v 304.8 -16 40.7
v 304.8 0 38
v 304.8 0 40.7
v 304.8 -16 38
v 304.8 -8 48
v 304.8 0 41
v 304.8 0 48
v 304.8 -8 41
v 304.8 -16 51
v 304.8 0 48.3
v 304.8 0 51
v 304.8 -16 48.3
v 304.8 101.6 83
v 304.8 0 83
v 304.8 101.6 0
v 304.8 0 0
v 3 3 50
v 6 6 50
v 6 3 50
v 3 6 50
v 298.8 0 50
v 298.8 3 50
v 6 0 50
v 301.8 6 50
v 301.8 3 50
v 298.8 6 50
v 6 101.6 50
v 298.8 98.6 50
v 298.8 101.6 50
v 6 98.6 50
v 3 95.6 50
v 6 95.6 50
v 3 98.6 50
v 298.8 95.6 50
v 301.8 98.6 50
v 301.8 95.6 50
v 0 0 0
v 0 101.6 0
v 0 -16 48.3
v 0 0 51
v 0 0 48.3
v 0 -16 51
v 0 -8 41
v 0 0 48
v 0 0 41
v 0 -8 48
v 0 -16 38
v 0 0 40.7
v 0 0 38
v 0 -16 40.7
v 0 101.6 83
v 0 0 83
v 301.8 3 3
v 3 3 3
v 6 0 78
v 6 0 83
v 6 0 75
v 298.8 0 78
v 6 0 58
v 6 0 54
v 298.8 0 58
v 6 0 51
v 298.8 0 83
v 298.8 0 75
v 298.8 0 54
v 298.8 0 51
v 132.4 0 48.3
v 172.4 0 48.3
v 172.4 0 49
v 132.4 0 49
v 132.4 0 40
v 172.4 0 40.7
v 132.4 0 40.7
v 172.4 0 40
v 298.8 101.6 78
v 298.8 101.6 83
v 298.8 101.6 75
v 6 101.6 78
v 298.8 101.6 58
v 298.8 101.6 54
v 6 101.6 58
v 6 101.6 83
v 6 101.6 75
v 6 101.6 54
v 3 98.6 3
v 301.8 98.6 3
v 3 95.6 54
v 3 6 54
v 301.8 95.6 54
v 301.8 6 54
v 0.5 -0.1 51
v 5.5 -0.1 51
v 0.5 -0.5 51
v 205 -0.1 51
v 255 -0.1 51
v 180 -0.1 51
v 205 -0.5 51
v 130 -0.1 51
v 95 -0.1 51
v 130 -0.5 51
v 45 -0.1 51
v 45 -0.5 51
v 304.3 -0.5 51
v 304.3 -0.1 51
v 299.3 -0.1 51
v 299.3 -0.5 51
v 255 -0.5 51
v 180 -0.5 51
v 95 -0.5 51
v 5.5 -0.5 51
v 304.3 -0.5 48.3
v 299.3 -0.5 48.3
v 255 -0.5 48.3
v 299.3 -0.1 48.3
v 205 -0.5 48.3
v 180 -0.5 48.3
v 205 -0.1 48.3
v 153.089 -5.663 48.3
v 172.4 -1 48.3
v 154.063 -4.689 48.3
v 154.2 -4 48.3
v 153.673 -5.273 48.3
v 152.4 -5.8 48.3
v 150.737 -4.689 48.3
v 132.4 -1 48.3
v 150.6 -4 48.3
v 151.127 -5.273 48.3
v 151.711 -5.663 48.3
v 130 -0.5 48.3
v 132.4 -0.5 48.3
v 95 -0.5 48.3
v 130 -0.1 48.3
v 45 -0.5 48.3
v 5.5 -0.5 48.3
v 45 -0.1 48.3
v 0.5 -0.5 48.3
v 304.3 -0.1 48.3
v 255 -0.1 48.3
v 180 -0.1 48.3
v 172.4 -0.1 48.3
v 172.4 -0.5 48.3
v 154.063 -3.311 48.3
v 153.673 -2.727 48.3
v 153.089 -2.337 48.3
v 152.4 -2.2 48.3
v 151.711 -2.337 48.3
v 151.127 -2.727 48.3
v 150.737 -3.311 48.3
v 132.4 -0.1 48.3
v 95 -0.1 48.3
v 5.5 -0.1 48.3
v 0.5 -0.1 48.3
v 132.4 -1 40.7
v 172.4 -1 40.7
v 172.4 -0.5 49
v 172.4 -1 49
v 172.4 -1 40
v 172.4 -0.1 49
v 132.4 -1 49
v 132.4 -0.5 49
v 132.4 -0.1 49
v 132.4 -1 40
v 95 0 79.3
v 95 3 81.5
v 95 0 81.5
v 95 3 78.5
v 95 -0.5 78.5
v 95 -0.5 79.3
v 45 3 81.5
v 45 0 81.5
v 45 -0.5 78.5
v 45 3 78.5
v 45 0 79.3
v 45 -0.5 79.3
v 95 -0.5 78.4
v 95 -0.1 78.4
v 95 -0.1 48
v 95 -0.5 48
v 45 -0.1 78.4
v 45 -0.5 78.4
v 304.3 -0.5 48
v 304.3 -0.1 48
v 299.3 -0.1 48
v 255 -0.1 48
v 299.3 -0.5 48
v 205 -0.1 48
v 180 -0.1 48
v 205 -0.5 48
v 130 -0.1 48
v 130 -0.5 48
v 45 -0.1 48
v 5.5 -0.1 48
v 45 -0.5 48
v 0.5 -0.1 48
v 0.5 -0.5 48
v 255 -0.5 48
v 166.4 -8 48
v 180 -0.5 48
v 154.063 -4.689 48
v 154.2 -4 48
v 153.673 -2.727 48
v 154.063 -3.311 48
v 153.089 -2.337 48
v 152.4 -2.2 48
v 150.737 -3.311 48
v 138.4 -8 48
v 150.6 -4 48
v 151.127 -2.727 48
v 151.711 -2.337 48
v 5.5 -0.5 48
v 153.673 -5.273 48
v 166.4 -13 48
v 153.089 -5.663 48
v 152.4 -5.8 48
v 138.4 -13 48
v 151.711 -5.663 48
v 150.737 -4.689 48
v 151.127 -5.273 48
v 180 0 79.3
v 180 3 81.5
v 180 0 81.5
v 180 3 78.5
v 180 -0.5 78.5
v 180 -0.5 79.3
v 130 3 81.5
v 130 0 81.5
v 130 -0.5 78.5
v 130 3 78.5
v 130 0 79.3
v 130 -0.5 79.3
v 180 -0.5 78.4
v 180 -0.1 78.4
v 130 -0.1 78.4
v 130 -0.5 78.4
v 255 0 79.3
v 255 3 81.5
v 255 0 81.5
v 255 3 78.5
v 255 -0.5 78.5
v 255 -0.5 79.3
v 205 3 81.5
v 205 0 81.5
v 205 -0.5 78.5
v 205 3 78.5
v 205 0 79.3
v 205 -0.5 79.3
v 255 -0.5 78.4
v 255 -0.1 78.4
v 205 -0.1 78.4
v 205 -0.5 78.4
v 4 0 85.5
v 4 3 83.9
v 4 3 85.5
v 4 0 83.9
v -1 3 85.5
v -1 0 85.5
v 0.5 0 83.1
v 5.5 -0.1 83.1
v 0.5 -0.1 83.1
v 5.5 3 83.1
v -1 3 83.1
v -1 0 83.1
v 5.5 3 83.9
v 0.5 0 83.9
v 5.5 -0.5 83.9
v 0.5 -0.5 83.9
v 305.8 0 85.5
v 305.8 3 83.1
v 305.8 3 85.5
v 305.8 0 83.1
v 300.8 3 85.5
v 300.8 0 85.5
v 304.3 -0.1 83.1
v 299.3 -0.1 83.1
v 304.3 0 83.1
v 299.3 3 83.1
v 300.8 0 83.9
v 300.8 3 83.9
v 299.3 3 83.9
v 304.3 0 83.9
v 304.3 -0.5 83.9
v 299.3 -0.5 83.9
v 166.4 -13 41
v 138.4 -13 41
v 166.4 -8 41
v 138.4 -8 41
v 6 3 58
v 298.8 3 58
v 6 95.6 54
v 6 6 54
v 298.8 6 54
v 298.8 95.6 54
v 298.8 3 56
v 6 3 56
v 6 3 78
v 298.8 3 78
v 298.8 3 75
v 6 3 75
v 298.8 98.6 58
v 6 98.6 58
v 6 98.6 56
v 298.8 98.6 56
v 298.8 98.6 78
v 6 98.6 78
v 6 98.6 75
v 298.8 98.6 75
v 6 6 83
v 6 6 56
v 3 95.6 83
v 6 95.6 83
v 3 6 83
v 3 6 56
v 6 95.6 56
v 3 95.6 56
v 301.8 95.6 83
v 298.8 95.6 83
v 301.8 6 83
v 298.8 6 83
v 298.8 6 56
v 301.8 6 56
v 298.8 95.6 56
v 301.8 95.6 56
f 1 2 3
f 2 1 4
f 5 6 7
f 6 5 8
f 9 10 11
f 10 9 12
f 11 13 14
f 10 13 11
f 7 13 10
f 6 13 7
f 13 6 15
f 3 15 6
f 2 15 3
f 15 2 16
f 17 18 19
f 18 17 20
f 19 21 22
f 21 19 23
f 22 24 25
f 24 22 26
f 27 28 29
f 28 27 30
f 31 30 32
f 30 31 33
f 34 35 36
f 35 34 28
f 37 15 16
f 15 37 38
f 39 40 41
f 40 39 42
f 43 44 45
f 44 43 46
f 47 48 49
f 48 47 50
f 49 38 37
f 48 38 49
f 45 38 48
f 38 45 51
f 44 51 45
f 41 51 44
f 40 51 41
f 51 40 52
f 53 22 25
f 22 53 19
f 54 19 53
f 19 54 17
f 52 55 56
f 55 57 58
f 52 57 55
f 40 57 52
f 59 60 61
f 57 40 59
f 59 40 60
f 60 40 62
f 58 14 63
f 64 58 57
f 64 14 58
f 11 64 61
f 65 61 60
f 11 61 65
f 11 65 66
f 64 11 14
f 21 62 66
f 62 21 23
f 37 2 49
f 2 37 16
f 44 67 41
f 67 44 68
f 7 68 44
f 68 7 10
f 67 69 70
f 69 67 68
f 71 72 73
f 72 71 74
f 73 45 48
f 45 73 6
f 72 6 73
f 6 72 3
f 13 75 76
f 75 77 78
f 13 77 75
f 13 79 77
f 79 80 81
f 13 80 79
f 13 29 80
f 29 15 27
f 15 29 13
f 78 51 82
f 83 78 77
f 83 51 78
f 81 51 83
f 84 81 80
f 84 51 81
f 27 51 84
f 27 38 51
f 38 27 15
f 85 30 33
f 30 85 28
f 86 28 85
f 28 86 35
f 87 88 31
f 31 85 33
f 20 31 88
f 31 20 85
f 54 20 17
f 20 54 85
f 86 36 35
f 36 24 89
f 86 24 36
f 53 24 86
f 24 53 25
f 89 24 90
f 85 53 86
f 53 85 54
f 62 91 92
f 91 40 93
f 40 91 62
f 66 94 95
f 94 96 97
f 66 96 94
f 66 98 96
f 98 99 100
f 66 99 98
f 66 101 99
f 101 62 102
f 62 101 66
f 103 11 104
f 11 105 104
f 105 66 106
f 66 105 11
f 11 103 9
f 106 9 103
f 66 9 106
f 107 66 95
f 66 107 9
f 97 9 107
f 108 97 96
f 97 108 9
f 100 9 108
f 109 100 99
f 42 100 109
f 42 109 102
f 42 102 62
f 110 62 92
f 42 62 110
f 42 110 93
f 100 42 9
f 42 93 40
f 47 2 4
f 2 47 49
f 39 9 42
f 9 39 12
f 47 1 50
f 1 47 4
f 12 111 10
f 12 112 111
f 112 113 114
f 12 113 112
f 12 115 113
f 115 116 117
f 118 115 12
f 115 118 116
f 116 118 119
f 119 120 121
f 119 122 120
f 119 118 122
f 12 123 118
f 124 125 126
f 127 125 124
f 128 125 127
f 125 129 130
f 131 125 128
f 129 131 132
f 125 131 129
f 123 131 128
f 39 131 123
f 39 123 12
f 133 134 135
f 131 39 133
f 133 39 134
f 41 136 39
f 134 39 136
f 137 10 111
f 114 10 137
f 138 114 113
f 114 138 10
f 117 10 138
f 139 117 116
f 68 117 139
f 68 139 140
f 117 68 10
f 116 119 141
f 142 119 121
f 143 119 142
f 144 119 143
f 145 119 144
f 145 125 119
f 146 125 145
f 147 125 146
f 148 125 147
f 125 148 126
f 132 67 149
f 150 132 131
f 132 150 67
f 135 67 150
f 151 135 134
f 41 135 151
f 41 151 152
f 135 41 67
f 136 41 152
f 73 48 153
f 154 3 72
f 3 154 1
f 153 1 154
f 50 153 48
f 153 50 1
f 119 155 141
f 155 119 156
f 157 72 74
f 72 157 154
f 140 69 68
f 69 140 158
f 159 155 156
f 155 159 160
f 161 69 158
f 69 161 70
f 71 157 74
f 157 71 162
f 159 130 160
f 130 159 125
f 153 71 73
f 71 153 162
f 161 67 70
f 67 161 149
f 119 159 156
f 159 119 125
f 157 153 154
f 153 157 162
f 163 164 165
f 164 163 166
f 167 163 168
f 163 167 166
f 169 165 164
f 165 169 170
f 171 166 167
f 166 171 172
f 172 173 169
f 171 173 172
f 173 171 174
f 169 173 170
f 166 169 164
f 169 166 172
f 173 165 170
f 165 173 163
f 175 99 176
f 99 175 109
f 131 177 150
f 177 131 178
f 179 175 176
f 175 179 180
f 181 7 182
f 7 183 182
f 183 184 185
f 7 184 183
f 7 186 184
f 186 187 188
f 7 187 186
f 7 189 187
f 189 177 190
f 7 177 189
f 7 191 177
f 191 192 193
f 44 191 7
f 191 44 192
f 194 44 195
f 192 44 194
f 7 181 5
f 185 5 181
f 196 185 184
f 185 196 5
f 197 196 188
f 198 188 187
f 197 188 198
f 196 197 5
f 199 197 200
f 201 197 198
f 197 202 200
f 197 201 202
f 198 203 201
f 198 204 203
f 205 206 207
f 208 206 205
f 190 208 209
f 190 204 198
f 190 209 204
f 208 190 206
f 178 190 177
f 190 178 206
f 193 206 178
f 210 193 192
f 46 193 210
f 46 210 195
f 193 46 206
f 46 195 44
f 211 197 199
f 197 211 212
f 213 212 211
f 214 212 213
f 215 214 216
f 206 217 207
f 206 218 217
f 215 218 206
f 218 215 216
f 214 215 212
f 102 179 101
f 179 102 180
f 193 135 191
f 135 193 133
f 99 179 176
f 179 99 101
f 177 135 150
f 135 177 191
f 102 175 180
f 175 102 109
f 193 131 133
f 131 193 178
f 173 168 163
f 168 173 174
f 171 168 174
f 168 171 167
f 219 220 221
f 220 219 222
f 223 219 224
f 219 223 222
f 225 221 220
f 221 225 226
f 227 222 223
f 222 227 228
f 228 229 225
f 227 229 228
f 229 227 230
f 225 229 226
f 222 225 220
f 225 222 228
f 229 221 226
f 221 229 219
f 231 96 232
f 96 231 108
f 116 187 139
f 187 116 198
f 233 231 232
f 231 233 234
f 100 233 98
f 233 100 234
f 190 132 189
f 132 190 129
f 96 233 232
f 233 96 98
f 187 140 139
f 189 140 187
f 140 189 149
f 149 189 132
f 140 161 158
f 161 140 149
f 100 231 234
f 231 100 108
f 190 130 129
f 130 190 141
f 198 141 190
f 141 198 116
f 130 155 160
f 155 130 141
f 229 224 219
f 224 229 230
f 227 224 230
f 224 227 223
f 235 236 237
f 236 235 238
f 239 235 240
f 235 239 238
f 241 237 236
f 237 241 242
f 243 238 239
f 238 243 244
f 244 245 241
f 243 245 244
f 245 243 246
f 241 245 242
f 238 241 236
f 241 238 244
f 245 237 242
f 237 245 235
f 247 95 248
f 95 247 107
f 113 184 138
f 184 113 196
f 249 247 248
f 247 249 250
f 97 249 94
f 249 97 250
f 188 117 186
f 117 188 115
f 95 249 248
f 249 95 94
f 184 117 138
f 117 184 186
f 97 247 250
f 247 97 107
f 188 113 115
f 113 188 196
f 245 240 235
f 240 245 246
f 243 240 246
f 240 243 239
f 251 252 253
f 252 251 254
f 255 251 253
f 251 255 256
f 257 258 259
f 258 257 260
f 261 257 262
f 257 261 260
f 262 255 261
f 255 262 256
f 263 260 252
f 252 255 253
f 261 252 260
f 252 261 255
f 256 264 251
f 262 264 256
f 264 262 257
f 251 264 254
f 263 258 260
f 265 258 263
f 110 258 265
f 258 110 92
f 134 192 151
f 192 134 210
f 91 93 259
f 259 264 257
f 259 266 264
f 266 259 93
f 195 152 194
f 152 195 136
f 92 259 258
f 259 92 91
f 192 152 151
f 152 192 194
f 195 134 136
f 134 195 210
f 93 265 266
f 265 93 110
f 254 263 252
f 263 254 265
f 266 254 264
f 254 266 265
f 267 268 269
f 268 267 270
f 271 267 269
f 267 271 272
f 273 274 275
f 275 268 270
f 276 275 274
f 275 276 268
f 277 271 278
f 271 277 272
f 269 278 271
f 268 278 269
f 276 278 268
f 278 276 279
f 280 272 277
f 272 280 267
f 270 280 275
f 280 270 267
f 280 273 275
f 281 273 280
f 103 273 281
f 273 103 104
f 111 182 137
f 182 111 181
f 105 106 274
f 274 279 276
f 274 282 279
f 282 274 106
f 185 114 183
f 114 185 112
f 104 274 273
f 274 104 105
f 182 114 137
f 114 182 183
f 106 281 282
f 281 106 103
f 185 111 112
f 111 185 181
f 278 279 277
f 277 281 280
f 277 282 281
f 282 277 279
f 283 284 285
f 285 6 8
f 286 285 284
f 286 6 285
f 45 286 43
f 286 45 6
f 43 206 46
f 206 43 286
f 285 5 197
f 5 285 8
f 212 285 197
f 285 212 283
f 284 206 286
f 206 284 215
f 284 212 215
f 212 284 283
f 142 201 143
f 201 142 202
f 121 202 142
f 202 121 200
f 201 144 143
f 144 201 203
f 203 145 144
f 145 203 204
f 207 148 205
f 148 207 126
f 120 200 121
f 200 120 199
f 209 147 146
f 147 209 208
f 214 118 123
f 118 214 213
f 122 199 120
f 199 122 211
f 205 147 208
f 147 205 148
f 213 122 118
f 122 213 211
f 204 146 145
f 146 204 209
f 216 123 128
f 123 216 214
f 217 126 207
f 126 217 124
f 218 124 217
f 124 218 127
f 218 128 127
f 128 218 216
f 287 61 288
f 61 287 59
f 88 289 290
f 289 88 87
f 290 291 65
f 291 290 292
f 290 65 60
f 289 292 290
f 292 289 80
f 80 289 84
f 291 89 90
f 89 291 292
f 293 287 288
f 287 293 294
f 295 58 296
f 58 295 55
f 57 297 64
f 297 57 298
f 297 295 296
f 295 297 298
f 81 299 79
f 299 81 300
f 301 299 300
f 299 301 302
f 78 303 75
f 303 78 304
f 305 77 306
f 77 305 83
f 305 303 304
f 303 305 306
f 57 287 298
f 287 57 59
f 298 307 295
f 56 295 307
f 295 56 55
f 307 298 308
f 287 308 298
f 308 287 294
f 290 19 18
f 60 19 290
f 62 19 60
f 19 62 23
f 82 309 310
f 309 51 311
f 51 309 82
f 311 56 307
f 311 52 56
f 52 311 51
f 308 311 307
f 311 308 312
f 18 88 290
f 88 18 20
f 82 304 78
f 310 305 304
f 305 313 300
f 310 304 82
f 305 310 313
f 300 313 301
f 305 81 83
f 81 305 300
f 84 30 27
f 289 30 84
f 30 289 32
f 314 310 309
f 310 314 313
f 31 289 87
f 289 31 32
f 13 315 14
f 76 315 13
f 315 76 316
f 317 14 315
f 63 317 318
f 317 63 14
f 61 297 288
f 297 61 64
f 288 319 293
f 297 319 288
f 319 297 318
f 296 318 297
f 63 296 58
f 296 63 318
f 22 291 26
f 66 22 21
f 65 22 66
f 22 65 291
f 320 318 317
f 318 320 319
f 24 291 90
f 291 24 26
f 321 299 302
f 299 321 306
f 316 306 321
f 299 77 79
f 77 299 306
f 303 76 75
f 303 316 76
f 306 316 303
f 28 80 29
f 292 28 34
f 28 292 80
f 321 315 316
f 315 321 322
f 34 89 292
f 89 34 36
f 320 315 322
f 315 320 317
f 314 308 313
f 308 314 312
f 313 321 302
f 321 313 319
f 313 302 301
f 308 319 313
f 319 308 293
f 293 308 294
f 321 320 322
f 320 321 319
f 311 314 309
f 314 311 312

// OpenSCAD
// file: ../top_ref.scad
// top_ref.scad  — FAITHFUL reference of the real uploaded top tray (L3.stl)
// Extracted from L3.stl by voxel analysis. Coordinates: new-tray top face = z=0 here,
// call top_ref(base=50) to seat it on a 50mm-tall new tray.
// DO NOT MODIFY THIS PART IN ANY DESIGN — it represents an already-printed tray.
//
// Real dims: 304.8 (X) x 101.6 (Y) x 33 (Z).
//  - END walls (short, x=0..3 and 301.8..304.8): SOLID full height -> top at z=33 (seated 83)
//  - LONG sides (front y=0..3, back y=98.6..101.6): OPEN FRAME
//        bottom rail z=4..8, top rail z=25..28, OPEN between (z=9..24)
//        side top edge at z=28 (seated 78)
//  - Corners: full height to z=33 (seated 83)
//  - Floor plate: z=4..6
// Seated mapping (base=50): add 50 to every z below.

TR_X = 304.8;
TR_Y = 101.6;
TR_Z = 33;
TR_wall = 3;        // side/end wall thickness
TR_endw = 3;        // short-end wall thickness
TR_botrail_z0 = 4;  TR_botrail_z1 = 8;     // long-side bottom rail
TR_toprail_z0 = 25; TR_toprail_z1 = 28;    // long-side top rail (side top edge=28)
TR_floor_z0 = 4;    TR_floor_z1 = 6;
TR_corner = 6;      // corner post footprint (x & y) kept full height

module top_ref(base=50, col="#90A4AE", alpha=1.0) {
    color(col, alpha)
    translate([0,0,base])
    union() {
        // ---- floor plate ----
        translate([TR_endw, TR_wall, TR_floor_z0])
            cube([TR_X-2*TR_endw, TR_Y-2*TR_wall, TR_floor_z1-TR_floor_z0]);
        // ---- two short END walls: full height ----
        cube([TR_endw, TR_Y, TR_Z]);
        translate([TR_X-TR_endw,0,0]) cube([TR_endw, TR_Y, TR_Z]);
        // ---- long-side OPEN FRAMES (front & back) ----
        for (yy=[0, TR_Y-TR_wall]) {
            // bottom rail
            translate([0, yy, TR_botrail_z0]) cube([TR_X, TR_wall, TR_botrail_z1-TR_botrail_z0]);
            // top rail (side top edge)
            translate([0, yy, TR_toprail_z0]) cube([TR_X, TR_wall, TR_toprail_z1-TR_toprail_z0]);
        }
        // ---- corner posts full height (tie frames together, reach z=33) ----
        for (xx=[0, TR_X-TR_corner], yy=[0, TR_Y-TR_corner])
            translate([xx,yy,0]) cube([TR_corner, TR_corner, TR_Z]);
    }
}

// Convenience constants a design can reference (seated, base=50):
//   END-wall top edge:        z = 50+33 = 83  (over the short ends -> strong clamp)
//   Long-side top rail top:   z = 50+28 = 78  (hook over / under along front)
//   Long-side open slot:      z = 50+9 .. 50+24 = 59..74 (reach a tongue in anywhere)
//   Corner top:               z = 83
// main file
// 02_endclamp.scad — End-Wall Clamp + Front Tongue Bar
// Variant with primary capture on the SHORT END WALLS (solid to z=83) AND
// secondary front tongue bar.  A single horizontal push (±X) on the bar
// simultaneously drives end clamps over the end-wall top edges and front
// tongues above the front top-rail.  Door side flush throughout.
//
// End walls (seated): x=0..3 (left) and x=301.8..304.8 (right), z=50..83 solid.
// End clamp: thin clip that slides in +X (left side) or -X (right side) to
// sit above end-wall top at z=83.5..86.5 — catches if top tray tries to lift.
//
// Front tongues: same capture approach as 01_pushbar — caps at z=78.5..81.5,
// y=0..3 when locked.

show  = "all";  // [all, new, top]
lock  = 1;      // 0=unlocked  1=locked

include <../top_ref.scad>

T_X = 304.8;  T_Y = 101.6;  T_Z = 50;  T_W = 3;

// ── Bar & travel ───────────────────────────────────────────────────────────
// Bar slides in +Y (push to lock) — same as 01 but narrower
BAR_TRAVEL = 8;
BAR_D      = 8;
BAR_H      = 7;
BAR_Z0     = T_Z - BAR_H - 2;   // z=41
bar_front  = lock ? 0.0 : -BAR_TRAVEL;
bar_rear   = bar_front - BAR_D;

HSG_Z0   = BAR_Z0 - 3;
HSG_H    = BAR_H + 6;

// ── Front tongue caps (primary front capture) ────────────────────────────
CAP_Z0  = 78.5;
CAP_Z1  = 81.5;
CAP_TH  = T_W;
CAP_W   = 50;
CAP_CX  = [70, 155, 230];   // 3 caps for this variant

ARM_Y0  = bar_front - 0.5;
ARM_TH  = 0.4;
ARM_Z0  = BAR_Z0 + BAR_H;
ARM_Z1  = 78.4;

// ── End-wall clamp geometry ───────────────────────────────────────────────
// Left end wall: x=0..3, z=50..83. Clamp rides on bar (bar slides +Y).
// Clamp lip: x = -1.5 .. 3.5 (straddles end wall top), z=83.1..85.5
// Clamp body: connects to bar, rises from bar top to z=84
//
// At locked (bar_front=0): clamp at y=0..4 (front of tray area)
// At unlocked (bar_front=-8): clamp at y=-8..-4 (retracted, clear of top tray)
//
// The clamp stays at a fixed X relative to the bar (no separate X motion here)
// Left clamp rides the leftmost part of the bar, right clamp the rightmost.
CLAMP_LIP_Z0   = 83.1;   // 0.1mm above end-wall top (z=83)
CLAMP_LIP_Z1   = 85.5;
CLAMP_LIP_XL   = -1.0;   // extends slightly past x=0 to straddle
CLAMP_LIP_XR   =  4.0;   // and slightly past x=3
CLAMP_LIP_Y    = 3.0;    // same as CAP_TH in Y
CLAMP_ARM_W    = 5.0;    // clamp arm width in X
CLAMP_ARM_TH   = 0.4;    // thin arm in Y (stays at y<0)
CLAMP_ARM_X_L  = 0.5;    // X position of left arm
CLAMP_ARM_X_R  = T_X - CLAMP_ARM_W - 0.5;

// Right end wall mirror
CLAMP_LIP_XR2  = T_X + 1.0;
CLAMP_LIP_XL2  = T_X - 4.0;

module new_tray() {
    color("#1565C0") {
        cube([T_X, T_W, T_Z]);
        translate([0, T_Y-T_W, 0]) cube([T_X, T_W, T_Z]);
        cube([T_W, T_Y, T_Z]);
        translate([T_X-T_W, 0, 0]) cube([T_W, T_Y, T_Z]);
        cube([T_X, T_Y, T_W]);
    }
}

module housing_fixed() {
    color("#F9A825")
    difference() {
        translate([0, -(BAR_D + BAR_TRAVEL), HSG_Z0])
            cube([T_X, BAR_D + BAR_TRAVEL, HSG_H]);
        // Bar channel
        translate([-1, -(BAR_D + BAR_TRAVEL) - 0.3, BAR_Z0 - 0.3])
            cube([T_X+2, BAR_D + BAR_TRAVEL + 0.6, BAR_H + 0.6]);
        // Finger opening
        translate([T_X/2 - 20, -1, BAR_Z0 - 1])
            cube([40, 5, BAR_H + 2]);
    }
}

module front_caps() {
    for (cx = CAP_CX) {
        tx0 = max(cx - CAP_W/2, 7.0);
        tx1 = min(cx + CAP_W/2, 297.8);
        tw  = tx1 - tx0;
        if (tw > 5) {
            translate([tx0, bar_front, CAP_Z0])
                cube([tw, CAP_TH, CAP_Z1 - CAP_Z0]);
            translate([tx0, ARM_Y0, ARM_Z0])
                cube([tw, ARM_TH, ARM_Z1 - ARM_Z0]);
            translate([tx0, ARM_Y0, CAP_Z0])
                cube([tw, bar_front - ARM_Y0 + CAP_TH, 0.8]);
        }
    }
}

module end_clamps() {
    // Clamp lip: at z=83.1..85.5, y=bar_front..bar_front+CLAMP_LIP_Y
    // Left clamp (over x=0..3 end wall)
    translate([CLAMP_LIP_XL, bar_front, CLAMP_LIP_Z0])
        cube([CLAMP_LIP_XR - CLAMP_LIP_XL, CLAMP_LIP_Y, CLAMP_LIP_Z1 - CLAMP_LIP_Z0]);
    // Left clamp arm (y < 0, rising from bar top)
    translate([CLAMP_ARM_X_L, ARM_Y0, ARM_Z0])
        cube([CLAMP_ARM_W, CLAMP_ARM_TH, CLAMP_LIP_Z0 - ARM_Z0]);
    // Left clamp horizontal bridge
    translate([CLAMP_ARM_X_L, ARM_Y0, CLAMP_LIP_Z0])
        cube([CLAMP_ARM_W, bar_front - ARM_Y0 + CLAMP_LIP_Y, 0.8]);

    // Right clamp (over x=301.8..304.8 end wall)
    translate([CLAMP_LIP_XL2, bar_front, CLAMP_LIP_Z0])
        cube([CLAMP_LIP_XR2 - CLAMP_LIP_XL2, CLAMP_LIP_Y, CLAMP_LIP_Z1 - CLAMP_LIP_Z0]);
    translate([CLAMP_ARM_X_R, ARM_Y0, ARM_Z0])
        cube([CLAMP_ARM_W, CLAMP_ARM_TH, CLAMP_LIP_Z0 - ARM_Z0]);
    translate([CLAMP_ARM_X_R, ARM_Y0, CLAMP_LIP_Z0])
        cube([CLAMP_ARM_W, bar_front - ARM_Y0 + CLAMP_LIP_Y, 0.8]);
}

module sliding_bar() {
    color("#C62828") {
        translate([0, bar_rear, BAR_Z0]) cube([T_X, BAR_D, BAR_H]);
        front_caps();
        end_clamps();
        // Finger tab
        translate([T_X/2 - 14, bar_rear - 5, BAR_Z0])
            cube([28, 5, BAR_H]);
        translate([T_X/2, bar_rear + BAR_D/2, BAR_Z0 + BAR_H])
            cylinder(r=1.8, h=1.0, $fn=16);
    }
}

module new_assembly(lk) {
    new_tray();
    housing_fixed();
    sliding_bar();
}

if (show != "top") new_assembly(lock);
if (show != "new") top_ref(50);
